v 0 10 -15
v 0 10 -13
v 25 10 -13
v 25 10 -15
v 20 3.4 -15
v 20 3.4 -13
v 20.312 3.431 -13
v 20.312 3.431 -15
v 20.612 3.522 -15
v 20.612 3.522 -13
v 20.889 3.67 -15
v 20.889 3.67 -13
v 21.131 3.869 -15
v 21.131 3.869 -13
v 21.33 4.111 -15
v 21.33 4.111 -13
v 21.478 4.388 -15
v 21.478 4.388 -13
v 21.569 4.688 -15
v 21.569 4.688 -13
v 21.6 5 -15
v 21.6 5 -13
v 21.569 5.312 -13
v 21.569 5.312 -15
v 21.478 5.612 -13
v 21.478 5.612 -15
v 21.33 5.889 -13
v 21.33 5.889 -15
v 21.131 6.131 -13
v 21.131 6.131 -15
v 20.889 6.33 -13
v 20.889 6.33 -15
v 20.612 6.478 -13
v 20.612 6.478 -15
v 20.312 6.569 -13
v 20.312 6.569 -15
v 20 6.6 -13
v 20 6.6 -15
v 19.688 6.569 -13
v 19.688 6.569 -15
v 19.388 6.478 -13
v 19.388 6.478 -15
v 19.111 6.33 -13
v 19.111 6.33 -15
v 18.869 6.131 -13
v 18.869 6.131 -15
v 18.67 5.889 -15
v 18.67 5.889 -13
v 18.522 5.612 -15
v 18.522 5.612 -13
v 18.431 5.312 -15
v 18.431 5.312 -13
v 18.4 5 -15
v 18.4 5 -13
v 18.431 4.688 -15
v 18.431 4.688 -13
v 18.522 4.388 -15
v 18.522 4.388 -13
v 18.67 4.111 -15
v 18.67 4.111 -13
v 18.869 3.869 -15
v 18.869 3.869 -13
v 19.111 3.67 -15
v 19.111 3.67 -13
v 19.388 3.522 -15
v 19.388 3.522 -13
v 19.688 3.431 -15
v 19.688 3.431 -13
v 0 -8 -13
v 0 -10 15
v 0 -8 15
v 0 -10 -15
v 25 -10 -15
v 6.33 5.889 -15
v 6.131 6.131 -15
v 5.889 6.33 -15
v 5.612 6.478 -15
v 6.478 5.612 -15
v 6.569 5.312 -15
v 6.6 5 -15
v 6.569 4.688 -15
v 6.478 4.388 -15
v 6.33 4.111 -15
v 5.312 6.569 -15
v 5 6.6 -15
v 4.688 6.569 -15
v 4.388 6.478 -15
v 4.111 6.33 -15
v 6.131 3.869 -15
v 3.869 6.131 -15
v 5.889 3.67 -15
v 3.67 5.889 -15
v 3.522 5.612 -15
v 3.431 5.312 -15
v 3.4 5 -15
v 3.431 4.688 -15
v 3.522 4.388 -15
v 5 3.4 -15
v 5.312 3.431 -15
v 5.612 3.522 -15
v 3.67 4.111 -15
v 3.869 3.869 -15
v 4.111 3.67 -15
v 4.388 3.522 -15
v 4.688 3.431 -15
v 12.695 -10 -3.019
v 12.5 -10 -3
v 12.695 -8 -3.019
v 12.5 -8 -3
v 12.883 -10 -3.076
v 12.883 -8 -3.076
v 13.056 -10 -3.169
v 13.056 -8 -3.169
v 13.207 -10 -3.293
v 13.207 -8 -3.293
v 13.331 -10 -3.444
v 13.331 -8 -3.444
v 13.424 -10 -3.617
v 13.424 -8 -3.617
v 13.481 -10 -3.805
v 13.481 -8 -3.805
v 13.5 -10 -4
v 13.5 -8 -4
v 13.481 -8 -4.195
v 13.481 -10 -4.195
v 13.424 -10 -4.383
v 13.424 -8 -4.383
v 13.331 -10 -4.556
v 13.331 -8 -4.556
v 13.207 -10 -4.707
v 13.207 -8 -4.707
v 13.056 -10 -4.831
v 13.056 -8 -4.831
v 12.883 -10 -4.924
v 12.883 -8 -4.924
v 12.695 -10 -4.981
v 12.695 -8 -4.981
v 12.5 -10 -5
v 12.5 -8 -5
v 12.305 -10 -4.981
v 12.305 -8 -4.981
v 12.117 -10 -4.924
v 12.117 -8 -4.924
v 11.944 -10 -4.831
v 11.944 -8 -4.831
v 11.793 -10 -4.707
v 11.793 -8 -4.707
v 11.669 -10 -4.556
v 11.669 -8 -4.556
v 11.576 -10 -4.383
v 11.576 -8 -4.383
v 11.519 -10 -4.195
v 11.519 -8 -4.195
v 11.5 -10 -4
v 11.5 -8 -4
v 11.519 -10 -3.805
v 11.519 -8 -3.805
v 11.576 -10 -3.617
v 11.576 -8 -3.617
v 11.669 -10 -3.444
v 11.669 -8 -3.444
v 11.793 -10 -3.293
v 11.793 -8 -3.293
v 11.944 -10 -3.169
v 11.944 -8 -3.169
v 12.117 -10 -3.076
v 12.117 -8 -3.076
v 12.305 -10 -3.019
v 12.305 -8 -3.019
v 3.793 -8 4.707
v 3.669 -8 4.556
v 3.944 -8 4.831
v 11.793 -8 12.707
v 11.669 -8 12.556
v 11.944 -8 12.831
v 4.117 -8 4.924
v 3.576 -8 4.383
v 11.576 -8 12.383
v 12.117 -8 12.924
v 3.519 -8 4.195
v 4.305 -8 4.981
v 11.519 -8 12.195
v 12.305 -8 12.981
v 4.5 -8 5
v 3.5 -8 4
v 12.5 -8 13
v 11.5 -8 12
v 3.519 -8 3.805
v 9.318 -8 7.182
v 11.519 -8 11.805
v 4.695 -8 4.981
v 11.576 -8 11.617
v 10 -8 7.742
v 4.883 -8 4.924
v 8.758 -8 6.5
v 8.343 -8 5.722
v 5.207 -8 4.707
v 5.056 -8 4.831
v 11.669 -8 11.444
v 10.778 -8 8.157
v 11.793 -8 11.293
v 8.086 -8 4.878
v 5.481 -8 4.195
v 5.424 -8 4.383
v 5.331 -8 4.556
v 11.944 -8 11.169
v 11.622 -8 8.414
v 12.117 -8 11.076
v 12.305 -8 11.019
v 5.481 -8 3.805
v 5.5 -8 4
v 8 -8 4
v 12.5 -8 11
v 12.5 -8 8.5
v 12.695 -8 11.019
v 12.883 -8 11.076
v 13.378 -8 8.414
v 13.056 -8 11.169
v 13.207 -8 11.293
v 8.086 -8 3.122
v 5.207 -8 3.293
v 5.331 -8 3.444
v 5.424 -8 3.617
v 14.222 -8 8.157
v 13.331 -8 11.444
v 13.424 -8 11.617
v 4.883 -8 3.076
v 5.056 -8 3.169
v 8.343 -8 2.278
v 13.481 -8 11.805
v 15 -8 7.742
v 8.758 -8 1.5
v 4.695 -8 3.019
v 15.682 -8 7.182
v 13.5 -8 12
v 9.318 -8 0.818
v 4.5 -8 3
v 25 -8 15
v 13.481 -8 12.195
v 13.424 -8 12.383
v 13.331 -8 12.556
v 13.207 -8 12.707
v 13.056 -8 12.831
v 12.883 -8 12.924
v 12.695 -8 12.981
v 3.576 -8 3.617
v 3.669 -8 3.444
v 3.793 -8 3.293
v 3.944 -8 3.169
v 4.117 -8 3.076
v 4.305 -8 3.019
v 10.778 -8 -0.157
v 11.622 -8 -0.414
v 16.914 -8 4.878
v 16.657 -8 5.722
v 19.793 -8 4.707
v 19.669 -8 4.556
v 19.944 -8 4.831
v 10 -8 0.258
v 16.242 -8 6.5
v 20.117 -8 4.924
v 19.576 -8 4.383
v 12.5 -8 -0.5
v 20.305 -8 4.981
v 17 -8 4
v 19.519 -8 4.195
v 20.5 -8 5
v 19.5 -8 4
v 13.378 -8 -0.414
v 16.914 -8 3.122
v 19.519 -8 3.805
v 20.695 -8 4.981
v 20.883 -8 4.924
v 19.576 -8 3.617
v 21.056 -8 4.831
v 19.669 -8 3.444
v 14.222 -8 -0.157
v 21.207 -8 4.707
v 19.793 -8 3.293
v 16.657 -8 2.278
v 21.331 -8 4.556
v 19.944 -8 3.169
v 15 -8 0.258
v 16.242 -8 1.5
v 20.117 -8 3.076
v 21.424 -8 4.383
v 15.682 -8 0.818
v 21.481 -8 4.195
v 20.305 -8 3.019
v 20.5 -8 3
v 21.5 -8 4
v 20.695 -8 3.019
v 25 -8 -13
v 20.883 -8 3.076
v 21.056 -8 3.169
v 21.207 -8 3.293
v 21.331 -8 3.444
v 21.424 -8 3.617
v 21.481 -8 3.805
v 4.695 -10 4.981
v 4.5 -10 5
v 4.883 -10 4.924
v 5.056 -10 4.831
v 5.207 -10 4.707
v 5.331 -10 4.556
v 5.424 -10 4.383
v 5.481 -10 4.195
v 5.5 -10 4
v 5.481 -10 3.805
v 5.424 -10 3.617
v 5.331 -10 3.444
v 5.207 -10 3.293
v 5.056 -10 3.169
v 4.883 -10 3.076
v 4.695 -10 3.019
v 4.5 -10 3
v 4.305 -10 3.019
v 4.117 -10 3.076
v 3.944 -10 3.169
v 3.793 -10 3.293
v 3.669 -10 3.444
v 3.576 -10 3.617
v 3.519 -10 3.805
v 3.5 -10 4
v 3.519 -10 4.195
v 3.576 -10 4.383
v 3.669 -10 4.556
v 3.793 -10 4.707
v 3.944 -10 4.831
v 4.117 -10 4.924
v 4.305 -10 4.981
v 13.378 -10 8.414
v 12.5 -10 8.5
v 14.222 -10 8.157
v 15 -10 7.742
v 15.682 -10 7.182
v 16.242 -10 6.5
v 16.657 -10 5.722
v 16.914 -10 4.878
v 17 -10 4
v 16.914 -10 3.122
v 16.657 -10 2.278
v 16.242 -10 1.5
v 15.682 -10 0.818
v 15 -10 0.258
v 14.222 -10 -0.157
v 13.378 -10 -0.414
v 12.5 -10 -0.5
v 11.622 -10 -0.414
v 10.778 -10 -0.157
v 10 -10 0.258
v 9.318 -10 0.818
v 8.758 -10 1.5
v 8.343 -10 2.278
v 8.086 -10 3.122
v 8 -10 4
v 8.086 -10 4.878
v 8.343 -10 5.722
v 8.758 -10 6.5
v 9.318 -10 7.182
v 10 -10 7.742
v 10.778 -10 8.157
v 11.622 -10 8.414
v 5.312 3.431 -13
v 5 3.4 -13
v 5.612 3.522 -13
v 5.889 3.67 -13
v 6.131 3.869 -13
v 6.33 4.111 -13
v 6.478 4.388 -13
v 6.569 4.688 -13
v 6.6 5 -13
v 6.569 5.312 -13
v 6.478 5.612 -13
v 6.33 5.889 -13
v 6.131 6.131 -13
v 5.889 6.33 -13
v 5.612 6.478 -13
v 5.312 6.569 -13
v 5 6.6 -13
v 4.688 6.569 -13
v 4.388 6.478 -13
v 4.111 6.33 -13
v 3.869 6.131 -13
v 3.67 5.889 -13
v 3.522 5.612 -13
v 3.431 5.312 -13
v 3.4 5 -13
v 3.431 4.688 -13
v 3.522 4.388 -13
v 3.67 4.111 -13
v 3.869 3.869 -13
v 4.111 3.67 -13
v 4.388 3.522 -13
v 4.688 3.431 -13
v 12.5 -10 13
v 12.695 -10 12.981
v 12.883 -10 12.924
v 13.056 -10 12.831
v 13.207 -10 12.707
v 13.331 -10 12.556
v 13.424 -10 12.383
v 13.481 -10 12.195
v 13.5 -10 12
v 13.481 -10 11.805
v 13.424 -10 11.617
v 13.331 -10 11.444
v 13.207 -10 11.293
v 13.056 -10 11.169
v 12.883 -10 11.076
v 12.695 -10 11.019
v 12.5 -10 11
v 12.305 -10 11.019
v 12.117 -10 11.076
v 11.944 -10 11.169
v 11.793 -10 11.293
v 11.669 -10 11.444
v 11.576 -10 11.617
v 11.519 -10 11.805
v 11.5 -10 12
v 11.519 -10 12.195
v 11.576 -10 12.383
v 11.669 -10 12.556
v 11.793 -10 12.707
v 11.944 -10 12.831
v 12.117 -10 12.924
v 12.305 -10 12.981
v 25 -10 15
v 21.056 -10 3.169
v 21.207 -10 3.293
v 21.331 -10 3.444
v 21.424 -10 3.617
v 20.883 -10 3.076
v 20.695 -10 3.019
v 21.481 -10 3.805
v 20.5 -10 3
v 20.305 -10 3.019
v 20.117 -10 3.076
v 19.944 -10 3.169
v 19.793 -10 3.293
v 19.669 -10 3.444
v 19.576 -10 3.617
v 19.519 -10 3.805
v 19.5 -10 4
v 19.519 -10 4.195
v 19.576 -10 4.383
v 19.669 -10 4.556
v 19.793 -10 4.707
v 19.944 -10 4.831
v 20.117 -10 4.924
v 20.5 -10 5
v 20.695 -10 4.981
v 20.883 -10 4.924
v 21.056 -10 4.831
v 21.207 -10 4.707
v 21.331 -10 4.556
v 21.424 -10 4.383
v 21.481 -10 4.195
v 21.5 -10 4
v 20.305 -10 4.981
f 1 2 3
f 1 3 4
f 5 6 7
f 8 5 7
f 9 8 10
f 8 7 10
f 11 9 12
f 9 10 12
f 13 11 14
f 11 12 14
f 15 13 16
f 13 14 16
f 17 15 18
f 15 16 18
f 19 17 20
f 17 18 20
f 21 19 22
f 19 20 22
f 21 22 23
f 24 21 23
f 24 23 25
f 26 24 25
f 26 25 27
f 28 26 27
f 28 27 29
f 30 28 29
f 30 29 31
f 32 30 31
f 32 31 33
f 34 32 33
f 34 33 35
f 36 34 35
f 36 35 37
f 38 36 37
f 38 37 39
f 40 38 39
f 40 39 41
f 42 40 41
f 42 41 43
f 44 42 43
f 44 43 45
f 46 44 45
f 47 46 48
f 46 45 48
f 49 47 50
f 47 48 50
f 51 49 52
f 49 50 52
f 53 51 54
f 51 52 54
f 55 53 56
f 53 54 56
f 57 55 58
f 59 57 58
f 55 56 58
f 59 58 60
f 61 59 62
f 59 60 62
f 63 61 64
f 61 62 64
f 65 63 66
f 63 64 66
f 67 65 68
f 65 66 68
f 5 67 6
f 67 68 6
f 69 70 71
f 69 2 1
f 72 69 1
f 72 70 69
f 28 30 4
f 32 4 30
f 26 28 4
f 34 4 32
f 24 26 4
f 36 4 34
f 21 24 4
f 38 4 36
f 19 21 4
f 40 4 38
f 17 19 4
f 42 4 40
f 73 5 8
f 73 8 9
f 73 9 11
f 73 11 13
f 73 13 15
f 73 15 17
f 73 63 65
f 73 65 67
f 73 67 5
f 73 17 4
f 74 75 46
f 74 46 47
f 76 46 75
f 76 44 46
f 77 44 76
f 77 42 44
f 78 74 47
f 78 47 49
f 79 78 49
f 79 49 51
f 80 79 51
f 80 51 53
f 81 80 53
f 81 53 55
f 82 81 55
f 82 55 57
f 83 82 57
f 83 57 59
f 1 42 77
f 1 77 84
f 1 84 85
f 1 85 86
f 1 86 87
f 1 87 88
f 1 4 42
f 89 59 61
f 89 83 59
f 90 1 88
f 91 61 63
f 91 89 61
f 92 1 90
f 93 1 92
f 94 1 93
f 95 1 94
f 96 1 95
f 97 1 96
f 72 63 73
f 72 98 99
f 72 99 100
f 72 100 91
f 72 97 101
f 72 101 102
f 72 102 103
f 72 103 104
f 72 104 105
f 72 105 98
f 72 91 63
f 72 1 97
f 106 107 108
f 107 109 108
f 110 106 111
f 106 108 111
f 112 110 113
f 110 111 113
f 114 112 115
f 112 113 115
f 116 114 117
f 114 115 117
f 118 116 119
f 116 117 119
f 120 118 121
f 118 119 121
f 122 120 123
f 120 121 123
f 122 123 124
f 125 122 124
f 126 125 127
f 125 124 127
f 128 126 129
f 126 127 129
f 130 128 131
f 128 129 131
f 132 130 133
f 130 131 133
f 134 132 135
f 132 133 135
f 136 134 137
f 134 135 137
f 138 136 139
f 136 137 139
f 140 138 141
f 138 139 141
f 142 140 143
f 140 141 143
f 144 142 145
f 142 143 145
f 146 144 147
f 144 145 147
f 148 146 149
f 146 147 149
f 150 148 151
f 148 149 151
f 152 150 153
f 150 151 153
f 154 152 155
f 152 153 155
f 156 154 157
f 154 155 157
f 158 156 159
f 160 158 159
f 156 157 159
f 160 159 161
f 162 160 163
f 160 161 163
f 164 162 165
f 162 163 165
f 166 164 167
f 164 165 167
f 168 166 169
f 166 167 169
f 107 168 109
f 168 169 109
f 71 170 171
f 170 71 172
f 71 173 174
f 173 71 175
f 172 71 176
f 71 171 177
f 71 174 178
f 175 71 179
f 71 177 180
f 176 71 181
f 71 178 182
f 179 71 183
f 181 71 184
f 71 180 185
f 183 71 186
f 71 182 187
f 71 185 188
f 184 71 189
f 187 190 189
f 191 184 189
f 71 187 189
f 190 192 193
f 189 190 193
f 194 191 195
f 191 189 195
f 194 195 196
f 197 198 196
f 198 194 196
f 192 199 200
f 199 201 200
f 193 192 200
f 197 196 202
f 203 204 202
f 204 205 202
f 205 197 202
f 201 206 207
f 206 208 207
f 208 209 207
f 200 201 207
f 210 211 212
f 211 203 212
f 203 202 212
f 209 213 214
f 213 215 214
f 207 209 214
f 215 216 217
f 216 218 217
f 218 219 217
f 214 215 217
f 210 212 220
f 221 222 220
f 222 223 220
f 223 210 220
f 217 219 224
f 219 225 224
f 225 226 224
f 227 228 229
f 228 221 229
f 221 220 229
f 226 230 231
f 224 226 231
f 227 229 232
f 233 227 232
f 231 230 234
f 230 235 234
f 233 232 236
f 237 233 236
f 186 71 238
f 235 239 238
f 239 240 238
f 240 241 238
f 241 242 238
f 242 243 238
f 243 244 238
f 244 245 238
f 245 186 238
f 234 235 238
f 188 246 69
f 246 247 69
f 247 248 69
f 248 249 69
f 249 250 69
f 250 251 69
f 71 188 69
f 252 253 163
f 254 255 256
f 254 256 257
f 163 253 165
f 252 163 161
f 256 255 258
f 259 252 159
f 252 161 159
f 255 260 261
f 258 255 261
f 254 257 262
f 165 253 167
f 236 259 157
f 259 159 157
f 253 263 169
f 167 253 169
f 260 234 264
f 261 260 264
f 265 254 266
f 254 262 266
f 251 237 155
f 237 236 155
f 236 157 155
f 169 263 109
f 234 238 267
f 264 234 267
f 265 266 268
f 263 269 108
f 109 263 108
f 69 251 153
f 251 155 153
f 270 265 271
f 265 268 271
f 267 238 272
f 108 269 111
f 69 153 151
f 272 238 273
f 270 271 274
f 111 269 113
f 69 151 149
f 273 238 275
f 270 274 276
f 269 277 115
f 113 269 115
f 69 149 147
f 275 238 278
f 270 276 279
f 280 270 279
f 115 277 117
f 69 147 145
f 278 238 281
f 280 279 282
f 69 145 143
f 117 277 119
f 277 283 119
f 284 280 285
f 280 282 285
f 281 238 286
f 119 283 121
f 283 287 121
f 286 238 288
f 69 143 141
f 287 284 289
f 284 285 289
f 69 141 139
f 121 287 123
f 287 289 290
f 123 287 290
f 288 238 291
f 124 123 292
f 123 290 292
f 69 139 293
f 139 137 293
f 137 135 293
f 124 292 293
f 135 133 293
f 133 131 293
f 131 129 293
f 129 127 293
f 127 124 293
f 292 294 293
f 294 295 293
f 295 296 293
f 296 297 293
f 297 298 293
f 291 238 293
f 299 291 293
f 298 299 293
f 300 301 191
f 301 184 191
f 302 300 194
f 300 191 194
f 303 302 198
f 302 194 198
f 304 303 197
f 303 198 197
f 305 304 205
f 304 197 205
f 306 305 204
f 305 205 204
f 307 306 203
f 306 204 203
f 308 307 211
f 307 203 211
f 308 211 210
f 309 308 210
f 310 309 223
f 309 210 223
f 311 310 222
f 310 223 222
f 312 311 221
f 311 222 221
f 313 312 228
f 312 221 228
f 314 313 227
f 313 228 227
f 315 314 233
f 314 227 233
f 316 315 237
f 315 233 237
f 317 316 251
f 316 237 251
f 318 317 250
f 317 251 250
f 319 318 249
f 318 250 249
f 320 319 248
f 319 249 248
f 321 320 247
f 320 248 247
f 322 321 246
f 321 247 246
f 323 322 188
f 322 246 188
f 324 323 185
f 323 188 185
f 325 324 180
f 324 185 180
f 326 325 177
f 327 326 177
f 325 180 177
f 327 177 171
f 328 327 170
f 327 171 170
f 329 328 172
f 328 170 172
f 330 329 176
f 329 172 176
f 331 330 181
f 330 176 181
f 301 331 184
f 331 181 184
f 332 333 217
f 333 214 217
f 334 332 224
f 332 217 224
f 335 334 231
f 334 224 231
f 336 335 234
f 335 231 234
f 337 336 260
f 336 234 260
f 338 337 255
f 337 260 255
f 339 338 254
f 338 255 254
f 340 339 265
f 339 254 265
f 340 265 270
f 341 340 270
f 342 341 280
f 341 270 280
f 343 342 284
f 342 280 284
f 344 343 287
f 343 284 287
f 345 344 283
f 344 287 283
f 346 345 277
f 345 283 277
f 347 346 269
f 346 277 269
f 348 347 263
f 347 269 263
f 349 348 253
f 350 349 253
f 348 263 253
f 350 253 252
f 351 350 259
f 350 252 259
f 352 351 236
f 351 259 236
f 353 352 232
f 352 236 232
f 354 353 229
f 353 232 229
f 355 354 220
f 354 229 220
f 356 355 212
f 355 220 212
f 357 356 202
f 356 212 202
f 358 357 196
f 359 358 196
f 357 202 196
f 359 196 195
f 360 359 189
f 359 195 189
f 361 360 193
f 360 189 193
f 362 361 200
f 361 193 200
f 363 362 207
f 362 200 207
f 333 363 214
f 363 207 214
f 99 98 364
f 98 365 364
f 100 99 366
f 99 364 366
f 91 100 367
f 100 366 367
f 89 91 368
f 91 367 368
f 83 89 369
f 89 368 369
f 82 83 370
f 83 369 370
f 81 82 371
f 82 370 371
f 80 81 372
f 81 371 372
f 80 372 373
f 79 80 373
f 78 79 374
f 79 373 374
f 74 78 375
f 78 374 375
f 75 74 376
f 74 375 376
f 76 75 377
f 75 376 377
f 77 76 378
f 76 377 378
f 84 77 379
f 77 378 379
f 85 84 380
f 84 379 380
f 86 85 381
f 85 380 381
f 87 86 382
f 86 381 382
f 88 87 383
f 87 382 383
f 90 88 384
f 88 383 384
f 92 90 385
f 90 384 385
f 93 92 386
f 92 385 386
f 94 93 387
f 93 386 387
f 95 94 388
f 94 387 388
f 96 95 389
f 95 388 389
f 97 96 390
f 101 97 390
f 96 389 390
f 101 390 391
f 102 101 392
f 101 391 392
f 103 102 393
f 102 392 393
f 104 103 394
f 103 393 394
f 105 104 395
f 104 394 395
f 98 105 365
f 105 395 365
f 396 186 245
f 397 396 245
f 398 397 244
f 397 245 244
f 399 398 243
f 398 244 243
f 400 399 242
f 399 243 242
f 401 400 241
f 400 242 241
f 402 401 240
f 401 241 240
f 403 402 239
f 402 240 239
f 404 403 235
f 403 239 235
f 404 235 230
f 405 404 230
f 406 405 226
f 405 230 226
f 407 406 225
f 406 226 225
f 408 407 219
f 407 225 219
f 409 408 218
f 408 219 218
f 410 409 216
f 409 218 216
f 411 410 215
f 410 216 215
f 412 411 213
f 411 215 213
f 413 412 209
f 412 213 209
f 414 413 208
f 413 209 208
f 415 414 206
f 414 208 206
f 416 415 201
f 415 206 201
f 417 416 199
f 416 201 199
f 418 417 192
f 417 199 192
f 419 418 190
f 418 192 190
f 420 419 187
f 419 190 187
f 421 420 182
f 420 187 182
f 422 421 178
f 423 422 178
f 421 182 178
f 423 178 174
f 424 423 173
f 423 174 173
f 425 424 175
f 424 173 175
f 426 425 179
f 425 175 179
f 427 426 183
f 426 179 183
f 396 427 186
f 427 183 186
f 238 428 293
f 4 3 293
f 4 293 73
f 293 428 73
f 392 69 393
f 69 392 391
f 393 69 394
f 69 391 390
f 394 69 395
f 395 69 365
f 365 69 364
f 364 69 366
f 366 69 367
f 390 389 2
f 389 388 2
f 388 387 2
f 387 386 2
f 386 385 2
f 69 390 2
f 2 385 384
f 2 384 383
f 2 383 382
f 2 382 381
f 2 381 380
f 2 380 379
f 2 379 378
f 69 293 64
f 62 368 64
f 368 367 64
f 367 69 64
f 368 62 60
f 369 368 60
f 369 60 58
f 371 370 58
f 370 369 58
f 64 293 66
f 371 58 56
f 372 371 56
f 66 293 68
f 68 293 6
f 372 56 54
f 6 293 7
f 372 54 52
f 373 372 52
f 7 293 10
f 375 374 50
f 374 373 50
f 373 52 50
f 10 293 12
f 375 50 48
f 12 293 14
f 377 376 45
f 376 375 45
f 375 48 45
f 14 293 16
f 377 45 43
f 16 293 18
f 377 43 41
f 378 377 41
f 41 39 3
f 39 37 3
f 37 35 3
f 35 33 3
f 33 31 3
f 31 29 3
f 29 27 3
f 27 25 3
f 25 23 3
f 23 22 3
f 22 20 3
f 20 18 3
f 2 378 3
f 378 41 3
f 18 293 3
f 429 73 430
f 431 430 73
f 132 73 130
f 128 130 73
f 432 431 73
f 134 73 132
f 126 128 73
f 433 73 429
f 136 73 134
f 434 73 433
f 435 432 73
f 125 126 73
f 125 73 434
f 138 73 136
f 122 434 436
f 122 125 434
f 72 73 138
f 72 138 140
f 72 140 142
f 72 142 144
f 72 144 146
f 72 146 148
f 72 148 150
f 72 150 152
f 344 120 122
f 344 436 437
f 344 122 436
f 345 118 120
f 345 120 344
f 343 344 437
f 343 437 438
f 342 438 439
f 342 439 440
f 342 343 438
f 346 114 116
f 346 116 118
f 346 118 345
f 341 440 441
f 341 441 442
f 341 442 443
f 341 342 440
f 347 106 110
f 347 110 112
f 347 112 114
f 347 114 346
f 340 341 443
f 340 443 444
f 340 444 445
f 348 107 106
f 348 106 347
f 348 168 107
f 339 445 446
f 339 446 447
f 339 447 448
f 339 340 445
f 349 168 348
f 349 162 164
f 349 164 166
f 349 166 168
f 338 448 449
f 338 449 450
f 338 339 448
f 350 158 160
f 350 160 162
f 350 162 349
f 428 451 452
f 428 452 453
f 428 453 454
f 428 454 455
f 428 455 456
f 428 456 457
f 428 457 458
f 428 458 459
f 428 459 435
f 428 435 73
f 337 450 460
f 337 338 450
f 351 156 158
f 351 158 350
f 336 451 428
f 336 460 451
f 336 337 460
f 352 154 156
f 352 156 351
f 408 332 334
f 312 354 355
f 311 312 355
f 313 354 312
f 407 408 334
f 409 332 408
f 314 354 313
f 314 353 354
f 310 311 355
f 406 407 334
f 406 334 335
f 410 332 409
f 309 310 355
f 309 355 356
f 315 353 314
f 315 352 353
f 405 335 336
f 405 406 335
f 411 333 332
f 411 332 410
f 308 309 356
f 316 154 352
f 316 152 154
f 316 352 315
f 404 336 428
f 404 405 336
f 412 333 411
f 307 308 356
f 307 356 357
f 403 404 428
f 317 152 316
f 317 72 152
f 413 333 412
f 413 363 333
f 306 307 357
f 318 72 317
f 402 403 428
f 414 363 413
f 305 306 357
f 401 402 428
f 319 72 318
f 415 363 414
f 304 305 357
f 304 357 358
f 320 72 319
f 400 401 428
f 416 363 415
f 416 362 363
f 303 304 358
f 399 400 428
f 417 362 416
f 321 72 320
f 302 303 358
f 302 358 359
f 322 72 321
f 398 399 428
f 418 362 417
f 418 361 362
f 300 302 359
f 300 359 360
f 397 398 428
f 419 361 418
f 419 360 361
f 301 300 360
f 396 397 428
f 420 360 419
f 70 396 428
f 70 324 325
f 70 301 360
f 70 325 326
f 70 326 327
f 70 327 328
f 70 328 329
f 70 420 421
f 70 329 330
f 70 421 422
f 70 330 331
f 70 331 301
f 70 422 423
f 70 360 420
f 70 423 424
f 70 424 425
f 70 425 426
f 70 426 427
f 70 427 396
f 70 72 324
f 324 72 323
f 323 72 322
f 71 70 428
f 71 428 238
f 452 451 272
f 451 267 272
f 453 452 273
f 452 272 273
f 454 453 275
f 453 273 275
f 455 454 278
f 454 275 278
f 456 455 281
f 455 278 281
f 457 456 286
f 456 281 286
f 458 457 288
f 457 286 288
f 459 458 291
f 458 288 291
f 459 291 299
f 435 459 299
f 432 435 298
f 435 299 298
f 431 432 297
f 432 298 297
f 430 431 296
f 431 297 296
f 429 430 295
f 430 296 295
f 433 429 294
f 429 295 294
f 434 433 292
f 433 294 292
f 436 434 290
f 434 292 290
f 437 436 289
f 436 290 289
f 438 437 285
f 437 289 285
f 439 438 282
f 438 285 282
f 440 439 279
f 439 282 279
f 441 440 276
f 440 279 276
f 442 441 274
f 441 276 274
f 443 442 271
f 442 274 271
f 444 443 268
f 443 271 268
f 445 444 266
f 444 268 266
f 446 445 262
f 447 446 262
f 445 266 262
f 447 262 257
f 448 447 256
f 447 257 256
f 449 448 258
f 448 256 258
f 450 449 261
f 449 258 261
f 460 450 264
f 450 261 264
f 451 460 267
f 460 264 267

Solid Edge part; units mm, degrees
sketch "Sketch1" plane through (0, 0, 0) normal (1, 0, 0) x (0, 1, 0)
  line L0 (10, -15) -> (-10, -15)
  line L1 (-10, -15) -> (-10, 15)
  line L2 (-10, 15) -> (10, 15)
  line L3 (10, 15) -> (10, -15)
  dimension "D1" = 30
  dimension "D2" = 20
extrude "Protrusion1" add sketch "Sketch1" along normal blind 25
sketch "Sketch2" plane through (25, 0, 0) normal (1, 0, 0) x (0, 1, 0)
  line L0 (10, 15) -> (-8, 15)
  line L1 (-8, 15) -> (-8, -13)
  line L2 (-8, -13) -> (10, -13)
  line L3 (10, -13) -> (10, 15)
  dimension "D1" = 2
  dimension "D2" = 2
extrude "Cutout1" cut sketch "Sketch2" against normal through all
hole "Hole_1" at (20, 5, -13) direction (0, 0, -1) diameter 3.2 end through all
hole "Hole1" at (5, 5, -13) direction (0, 0, -1) diameter 3.2 end through all
hole "Hole_3" at (12.5, -8, 12) direction (0, -1, 0) diameter 2 end through all
hole "Hole2" at (12.5, -8, -4) direction (0, -1, 0) diameter 2 end through all
hole "Hole3" at (20.5, -8, 4) direction (0, -1, 0) diameter 2 end through all
hole "Hole4" at (4.5, -8, 4) direction (0, -1, 0) diameter 2 end through all
hole "Hole_7" at (12.5, -8, 4) direction (0, -1, 0) diameter 9 end through all
